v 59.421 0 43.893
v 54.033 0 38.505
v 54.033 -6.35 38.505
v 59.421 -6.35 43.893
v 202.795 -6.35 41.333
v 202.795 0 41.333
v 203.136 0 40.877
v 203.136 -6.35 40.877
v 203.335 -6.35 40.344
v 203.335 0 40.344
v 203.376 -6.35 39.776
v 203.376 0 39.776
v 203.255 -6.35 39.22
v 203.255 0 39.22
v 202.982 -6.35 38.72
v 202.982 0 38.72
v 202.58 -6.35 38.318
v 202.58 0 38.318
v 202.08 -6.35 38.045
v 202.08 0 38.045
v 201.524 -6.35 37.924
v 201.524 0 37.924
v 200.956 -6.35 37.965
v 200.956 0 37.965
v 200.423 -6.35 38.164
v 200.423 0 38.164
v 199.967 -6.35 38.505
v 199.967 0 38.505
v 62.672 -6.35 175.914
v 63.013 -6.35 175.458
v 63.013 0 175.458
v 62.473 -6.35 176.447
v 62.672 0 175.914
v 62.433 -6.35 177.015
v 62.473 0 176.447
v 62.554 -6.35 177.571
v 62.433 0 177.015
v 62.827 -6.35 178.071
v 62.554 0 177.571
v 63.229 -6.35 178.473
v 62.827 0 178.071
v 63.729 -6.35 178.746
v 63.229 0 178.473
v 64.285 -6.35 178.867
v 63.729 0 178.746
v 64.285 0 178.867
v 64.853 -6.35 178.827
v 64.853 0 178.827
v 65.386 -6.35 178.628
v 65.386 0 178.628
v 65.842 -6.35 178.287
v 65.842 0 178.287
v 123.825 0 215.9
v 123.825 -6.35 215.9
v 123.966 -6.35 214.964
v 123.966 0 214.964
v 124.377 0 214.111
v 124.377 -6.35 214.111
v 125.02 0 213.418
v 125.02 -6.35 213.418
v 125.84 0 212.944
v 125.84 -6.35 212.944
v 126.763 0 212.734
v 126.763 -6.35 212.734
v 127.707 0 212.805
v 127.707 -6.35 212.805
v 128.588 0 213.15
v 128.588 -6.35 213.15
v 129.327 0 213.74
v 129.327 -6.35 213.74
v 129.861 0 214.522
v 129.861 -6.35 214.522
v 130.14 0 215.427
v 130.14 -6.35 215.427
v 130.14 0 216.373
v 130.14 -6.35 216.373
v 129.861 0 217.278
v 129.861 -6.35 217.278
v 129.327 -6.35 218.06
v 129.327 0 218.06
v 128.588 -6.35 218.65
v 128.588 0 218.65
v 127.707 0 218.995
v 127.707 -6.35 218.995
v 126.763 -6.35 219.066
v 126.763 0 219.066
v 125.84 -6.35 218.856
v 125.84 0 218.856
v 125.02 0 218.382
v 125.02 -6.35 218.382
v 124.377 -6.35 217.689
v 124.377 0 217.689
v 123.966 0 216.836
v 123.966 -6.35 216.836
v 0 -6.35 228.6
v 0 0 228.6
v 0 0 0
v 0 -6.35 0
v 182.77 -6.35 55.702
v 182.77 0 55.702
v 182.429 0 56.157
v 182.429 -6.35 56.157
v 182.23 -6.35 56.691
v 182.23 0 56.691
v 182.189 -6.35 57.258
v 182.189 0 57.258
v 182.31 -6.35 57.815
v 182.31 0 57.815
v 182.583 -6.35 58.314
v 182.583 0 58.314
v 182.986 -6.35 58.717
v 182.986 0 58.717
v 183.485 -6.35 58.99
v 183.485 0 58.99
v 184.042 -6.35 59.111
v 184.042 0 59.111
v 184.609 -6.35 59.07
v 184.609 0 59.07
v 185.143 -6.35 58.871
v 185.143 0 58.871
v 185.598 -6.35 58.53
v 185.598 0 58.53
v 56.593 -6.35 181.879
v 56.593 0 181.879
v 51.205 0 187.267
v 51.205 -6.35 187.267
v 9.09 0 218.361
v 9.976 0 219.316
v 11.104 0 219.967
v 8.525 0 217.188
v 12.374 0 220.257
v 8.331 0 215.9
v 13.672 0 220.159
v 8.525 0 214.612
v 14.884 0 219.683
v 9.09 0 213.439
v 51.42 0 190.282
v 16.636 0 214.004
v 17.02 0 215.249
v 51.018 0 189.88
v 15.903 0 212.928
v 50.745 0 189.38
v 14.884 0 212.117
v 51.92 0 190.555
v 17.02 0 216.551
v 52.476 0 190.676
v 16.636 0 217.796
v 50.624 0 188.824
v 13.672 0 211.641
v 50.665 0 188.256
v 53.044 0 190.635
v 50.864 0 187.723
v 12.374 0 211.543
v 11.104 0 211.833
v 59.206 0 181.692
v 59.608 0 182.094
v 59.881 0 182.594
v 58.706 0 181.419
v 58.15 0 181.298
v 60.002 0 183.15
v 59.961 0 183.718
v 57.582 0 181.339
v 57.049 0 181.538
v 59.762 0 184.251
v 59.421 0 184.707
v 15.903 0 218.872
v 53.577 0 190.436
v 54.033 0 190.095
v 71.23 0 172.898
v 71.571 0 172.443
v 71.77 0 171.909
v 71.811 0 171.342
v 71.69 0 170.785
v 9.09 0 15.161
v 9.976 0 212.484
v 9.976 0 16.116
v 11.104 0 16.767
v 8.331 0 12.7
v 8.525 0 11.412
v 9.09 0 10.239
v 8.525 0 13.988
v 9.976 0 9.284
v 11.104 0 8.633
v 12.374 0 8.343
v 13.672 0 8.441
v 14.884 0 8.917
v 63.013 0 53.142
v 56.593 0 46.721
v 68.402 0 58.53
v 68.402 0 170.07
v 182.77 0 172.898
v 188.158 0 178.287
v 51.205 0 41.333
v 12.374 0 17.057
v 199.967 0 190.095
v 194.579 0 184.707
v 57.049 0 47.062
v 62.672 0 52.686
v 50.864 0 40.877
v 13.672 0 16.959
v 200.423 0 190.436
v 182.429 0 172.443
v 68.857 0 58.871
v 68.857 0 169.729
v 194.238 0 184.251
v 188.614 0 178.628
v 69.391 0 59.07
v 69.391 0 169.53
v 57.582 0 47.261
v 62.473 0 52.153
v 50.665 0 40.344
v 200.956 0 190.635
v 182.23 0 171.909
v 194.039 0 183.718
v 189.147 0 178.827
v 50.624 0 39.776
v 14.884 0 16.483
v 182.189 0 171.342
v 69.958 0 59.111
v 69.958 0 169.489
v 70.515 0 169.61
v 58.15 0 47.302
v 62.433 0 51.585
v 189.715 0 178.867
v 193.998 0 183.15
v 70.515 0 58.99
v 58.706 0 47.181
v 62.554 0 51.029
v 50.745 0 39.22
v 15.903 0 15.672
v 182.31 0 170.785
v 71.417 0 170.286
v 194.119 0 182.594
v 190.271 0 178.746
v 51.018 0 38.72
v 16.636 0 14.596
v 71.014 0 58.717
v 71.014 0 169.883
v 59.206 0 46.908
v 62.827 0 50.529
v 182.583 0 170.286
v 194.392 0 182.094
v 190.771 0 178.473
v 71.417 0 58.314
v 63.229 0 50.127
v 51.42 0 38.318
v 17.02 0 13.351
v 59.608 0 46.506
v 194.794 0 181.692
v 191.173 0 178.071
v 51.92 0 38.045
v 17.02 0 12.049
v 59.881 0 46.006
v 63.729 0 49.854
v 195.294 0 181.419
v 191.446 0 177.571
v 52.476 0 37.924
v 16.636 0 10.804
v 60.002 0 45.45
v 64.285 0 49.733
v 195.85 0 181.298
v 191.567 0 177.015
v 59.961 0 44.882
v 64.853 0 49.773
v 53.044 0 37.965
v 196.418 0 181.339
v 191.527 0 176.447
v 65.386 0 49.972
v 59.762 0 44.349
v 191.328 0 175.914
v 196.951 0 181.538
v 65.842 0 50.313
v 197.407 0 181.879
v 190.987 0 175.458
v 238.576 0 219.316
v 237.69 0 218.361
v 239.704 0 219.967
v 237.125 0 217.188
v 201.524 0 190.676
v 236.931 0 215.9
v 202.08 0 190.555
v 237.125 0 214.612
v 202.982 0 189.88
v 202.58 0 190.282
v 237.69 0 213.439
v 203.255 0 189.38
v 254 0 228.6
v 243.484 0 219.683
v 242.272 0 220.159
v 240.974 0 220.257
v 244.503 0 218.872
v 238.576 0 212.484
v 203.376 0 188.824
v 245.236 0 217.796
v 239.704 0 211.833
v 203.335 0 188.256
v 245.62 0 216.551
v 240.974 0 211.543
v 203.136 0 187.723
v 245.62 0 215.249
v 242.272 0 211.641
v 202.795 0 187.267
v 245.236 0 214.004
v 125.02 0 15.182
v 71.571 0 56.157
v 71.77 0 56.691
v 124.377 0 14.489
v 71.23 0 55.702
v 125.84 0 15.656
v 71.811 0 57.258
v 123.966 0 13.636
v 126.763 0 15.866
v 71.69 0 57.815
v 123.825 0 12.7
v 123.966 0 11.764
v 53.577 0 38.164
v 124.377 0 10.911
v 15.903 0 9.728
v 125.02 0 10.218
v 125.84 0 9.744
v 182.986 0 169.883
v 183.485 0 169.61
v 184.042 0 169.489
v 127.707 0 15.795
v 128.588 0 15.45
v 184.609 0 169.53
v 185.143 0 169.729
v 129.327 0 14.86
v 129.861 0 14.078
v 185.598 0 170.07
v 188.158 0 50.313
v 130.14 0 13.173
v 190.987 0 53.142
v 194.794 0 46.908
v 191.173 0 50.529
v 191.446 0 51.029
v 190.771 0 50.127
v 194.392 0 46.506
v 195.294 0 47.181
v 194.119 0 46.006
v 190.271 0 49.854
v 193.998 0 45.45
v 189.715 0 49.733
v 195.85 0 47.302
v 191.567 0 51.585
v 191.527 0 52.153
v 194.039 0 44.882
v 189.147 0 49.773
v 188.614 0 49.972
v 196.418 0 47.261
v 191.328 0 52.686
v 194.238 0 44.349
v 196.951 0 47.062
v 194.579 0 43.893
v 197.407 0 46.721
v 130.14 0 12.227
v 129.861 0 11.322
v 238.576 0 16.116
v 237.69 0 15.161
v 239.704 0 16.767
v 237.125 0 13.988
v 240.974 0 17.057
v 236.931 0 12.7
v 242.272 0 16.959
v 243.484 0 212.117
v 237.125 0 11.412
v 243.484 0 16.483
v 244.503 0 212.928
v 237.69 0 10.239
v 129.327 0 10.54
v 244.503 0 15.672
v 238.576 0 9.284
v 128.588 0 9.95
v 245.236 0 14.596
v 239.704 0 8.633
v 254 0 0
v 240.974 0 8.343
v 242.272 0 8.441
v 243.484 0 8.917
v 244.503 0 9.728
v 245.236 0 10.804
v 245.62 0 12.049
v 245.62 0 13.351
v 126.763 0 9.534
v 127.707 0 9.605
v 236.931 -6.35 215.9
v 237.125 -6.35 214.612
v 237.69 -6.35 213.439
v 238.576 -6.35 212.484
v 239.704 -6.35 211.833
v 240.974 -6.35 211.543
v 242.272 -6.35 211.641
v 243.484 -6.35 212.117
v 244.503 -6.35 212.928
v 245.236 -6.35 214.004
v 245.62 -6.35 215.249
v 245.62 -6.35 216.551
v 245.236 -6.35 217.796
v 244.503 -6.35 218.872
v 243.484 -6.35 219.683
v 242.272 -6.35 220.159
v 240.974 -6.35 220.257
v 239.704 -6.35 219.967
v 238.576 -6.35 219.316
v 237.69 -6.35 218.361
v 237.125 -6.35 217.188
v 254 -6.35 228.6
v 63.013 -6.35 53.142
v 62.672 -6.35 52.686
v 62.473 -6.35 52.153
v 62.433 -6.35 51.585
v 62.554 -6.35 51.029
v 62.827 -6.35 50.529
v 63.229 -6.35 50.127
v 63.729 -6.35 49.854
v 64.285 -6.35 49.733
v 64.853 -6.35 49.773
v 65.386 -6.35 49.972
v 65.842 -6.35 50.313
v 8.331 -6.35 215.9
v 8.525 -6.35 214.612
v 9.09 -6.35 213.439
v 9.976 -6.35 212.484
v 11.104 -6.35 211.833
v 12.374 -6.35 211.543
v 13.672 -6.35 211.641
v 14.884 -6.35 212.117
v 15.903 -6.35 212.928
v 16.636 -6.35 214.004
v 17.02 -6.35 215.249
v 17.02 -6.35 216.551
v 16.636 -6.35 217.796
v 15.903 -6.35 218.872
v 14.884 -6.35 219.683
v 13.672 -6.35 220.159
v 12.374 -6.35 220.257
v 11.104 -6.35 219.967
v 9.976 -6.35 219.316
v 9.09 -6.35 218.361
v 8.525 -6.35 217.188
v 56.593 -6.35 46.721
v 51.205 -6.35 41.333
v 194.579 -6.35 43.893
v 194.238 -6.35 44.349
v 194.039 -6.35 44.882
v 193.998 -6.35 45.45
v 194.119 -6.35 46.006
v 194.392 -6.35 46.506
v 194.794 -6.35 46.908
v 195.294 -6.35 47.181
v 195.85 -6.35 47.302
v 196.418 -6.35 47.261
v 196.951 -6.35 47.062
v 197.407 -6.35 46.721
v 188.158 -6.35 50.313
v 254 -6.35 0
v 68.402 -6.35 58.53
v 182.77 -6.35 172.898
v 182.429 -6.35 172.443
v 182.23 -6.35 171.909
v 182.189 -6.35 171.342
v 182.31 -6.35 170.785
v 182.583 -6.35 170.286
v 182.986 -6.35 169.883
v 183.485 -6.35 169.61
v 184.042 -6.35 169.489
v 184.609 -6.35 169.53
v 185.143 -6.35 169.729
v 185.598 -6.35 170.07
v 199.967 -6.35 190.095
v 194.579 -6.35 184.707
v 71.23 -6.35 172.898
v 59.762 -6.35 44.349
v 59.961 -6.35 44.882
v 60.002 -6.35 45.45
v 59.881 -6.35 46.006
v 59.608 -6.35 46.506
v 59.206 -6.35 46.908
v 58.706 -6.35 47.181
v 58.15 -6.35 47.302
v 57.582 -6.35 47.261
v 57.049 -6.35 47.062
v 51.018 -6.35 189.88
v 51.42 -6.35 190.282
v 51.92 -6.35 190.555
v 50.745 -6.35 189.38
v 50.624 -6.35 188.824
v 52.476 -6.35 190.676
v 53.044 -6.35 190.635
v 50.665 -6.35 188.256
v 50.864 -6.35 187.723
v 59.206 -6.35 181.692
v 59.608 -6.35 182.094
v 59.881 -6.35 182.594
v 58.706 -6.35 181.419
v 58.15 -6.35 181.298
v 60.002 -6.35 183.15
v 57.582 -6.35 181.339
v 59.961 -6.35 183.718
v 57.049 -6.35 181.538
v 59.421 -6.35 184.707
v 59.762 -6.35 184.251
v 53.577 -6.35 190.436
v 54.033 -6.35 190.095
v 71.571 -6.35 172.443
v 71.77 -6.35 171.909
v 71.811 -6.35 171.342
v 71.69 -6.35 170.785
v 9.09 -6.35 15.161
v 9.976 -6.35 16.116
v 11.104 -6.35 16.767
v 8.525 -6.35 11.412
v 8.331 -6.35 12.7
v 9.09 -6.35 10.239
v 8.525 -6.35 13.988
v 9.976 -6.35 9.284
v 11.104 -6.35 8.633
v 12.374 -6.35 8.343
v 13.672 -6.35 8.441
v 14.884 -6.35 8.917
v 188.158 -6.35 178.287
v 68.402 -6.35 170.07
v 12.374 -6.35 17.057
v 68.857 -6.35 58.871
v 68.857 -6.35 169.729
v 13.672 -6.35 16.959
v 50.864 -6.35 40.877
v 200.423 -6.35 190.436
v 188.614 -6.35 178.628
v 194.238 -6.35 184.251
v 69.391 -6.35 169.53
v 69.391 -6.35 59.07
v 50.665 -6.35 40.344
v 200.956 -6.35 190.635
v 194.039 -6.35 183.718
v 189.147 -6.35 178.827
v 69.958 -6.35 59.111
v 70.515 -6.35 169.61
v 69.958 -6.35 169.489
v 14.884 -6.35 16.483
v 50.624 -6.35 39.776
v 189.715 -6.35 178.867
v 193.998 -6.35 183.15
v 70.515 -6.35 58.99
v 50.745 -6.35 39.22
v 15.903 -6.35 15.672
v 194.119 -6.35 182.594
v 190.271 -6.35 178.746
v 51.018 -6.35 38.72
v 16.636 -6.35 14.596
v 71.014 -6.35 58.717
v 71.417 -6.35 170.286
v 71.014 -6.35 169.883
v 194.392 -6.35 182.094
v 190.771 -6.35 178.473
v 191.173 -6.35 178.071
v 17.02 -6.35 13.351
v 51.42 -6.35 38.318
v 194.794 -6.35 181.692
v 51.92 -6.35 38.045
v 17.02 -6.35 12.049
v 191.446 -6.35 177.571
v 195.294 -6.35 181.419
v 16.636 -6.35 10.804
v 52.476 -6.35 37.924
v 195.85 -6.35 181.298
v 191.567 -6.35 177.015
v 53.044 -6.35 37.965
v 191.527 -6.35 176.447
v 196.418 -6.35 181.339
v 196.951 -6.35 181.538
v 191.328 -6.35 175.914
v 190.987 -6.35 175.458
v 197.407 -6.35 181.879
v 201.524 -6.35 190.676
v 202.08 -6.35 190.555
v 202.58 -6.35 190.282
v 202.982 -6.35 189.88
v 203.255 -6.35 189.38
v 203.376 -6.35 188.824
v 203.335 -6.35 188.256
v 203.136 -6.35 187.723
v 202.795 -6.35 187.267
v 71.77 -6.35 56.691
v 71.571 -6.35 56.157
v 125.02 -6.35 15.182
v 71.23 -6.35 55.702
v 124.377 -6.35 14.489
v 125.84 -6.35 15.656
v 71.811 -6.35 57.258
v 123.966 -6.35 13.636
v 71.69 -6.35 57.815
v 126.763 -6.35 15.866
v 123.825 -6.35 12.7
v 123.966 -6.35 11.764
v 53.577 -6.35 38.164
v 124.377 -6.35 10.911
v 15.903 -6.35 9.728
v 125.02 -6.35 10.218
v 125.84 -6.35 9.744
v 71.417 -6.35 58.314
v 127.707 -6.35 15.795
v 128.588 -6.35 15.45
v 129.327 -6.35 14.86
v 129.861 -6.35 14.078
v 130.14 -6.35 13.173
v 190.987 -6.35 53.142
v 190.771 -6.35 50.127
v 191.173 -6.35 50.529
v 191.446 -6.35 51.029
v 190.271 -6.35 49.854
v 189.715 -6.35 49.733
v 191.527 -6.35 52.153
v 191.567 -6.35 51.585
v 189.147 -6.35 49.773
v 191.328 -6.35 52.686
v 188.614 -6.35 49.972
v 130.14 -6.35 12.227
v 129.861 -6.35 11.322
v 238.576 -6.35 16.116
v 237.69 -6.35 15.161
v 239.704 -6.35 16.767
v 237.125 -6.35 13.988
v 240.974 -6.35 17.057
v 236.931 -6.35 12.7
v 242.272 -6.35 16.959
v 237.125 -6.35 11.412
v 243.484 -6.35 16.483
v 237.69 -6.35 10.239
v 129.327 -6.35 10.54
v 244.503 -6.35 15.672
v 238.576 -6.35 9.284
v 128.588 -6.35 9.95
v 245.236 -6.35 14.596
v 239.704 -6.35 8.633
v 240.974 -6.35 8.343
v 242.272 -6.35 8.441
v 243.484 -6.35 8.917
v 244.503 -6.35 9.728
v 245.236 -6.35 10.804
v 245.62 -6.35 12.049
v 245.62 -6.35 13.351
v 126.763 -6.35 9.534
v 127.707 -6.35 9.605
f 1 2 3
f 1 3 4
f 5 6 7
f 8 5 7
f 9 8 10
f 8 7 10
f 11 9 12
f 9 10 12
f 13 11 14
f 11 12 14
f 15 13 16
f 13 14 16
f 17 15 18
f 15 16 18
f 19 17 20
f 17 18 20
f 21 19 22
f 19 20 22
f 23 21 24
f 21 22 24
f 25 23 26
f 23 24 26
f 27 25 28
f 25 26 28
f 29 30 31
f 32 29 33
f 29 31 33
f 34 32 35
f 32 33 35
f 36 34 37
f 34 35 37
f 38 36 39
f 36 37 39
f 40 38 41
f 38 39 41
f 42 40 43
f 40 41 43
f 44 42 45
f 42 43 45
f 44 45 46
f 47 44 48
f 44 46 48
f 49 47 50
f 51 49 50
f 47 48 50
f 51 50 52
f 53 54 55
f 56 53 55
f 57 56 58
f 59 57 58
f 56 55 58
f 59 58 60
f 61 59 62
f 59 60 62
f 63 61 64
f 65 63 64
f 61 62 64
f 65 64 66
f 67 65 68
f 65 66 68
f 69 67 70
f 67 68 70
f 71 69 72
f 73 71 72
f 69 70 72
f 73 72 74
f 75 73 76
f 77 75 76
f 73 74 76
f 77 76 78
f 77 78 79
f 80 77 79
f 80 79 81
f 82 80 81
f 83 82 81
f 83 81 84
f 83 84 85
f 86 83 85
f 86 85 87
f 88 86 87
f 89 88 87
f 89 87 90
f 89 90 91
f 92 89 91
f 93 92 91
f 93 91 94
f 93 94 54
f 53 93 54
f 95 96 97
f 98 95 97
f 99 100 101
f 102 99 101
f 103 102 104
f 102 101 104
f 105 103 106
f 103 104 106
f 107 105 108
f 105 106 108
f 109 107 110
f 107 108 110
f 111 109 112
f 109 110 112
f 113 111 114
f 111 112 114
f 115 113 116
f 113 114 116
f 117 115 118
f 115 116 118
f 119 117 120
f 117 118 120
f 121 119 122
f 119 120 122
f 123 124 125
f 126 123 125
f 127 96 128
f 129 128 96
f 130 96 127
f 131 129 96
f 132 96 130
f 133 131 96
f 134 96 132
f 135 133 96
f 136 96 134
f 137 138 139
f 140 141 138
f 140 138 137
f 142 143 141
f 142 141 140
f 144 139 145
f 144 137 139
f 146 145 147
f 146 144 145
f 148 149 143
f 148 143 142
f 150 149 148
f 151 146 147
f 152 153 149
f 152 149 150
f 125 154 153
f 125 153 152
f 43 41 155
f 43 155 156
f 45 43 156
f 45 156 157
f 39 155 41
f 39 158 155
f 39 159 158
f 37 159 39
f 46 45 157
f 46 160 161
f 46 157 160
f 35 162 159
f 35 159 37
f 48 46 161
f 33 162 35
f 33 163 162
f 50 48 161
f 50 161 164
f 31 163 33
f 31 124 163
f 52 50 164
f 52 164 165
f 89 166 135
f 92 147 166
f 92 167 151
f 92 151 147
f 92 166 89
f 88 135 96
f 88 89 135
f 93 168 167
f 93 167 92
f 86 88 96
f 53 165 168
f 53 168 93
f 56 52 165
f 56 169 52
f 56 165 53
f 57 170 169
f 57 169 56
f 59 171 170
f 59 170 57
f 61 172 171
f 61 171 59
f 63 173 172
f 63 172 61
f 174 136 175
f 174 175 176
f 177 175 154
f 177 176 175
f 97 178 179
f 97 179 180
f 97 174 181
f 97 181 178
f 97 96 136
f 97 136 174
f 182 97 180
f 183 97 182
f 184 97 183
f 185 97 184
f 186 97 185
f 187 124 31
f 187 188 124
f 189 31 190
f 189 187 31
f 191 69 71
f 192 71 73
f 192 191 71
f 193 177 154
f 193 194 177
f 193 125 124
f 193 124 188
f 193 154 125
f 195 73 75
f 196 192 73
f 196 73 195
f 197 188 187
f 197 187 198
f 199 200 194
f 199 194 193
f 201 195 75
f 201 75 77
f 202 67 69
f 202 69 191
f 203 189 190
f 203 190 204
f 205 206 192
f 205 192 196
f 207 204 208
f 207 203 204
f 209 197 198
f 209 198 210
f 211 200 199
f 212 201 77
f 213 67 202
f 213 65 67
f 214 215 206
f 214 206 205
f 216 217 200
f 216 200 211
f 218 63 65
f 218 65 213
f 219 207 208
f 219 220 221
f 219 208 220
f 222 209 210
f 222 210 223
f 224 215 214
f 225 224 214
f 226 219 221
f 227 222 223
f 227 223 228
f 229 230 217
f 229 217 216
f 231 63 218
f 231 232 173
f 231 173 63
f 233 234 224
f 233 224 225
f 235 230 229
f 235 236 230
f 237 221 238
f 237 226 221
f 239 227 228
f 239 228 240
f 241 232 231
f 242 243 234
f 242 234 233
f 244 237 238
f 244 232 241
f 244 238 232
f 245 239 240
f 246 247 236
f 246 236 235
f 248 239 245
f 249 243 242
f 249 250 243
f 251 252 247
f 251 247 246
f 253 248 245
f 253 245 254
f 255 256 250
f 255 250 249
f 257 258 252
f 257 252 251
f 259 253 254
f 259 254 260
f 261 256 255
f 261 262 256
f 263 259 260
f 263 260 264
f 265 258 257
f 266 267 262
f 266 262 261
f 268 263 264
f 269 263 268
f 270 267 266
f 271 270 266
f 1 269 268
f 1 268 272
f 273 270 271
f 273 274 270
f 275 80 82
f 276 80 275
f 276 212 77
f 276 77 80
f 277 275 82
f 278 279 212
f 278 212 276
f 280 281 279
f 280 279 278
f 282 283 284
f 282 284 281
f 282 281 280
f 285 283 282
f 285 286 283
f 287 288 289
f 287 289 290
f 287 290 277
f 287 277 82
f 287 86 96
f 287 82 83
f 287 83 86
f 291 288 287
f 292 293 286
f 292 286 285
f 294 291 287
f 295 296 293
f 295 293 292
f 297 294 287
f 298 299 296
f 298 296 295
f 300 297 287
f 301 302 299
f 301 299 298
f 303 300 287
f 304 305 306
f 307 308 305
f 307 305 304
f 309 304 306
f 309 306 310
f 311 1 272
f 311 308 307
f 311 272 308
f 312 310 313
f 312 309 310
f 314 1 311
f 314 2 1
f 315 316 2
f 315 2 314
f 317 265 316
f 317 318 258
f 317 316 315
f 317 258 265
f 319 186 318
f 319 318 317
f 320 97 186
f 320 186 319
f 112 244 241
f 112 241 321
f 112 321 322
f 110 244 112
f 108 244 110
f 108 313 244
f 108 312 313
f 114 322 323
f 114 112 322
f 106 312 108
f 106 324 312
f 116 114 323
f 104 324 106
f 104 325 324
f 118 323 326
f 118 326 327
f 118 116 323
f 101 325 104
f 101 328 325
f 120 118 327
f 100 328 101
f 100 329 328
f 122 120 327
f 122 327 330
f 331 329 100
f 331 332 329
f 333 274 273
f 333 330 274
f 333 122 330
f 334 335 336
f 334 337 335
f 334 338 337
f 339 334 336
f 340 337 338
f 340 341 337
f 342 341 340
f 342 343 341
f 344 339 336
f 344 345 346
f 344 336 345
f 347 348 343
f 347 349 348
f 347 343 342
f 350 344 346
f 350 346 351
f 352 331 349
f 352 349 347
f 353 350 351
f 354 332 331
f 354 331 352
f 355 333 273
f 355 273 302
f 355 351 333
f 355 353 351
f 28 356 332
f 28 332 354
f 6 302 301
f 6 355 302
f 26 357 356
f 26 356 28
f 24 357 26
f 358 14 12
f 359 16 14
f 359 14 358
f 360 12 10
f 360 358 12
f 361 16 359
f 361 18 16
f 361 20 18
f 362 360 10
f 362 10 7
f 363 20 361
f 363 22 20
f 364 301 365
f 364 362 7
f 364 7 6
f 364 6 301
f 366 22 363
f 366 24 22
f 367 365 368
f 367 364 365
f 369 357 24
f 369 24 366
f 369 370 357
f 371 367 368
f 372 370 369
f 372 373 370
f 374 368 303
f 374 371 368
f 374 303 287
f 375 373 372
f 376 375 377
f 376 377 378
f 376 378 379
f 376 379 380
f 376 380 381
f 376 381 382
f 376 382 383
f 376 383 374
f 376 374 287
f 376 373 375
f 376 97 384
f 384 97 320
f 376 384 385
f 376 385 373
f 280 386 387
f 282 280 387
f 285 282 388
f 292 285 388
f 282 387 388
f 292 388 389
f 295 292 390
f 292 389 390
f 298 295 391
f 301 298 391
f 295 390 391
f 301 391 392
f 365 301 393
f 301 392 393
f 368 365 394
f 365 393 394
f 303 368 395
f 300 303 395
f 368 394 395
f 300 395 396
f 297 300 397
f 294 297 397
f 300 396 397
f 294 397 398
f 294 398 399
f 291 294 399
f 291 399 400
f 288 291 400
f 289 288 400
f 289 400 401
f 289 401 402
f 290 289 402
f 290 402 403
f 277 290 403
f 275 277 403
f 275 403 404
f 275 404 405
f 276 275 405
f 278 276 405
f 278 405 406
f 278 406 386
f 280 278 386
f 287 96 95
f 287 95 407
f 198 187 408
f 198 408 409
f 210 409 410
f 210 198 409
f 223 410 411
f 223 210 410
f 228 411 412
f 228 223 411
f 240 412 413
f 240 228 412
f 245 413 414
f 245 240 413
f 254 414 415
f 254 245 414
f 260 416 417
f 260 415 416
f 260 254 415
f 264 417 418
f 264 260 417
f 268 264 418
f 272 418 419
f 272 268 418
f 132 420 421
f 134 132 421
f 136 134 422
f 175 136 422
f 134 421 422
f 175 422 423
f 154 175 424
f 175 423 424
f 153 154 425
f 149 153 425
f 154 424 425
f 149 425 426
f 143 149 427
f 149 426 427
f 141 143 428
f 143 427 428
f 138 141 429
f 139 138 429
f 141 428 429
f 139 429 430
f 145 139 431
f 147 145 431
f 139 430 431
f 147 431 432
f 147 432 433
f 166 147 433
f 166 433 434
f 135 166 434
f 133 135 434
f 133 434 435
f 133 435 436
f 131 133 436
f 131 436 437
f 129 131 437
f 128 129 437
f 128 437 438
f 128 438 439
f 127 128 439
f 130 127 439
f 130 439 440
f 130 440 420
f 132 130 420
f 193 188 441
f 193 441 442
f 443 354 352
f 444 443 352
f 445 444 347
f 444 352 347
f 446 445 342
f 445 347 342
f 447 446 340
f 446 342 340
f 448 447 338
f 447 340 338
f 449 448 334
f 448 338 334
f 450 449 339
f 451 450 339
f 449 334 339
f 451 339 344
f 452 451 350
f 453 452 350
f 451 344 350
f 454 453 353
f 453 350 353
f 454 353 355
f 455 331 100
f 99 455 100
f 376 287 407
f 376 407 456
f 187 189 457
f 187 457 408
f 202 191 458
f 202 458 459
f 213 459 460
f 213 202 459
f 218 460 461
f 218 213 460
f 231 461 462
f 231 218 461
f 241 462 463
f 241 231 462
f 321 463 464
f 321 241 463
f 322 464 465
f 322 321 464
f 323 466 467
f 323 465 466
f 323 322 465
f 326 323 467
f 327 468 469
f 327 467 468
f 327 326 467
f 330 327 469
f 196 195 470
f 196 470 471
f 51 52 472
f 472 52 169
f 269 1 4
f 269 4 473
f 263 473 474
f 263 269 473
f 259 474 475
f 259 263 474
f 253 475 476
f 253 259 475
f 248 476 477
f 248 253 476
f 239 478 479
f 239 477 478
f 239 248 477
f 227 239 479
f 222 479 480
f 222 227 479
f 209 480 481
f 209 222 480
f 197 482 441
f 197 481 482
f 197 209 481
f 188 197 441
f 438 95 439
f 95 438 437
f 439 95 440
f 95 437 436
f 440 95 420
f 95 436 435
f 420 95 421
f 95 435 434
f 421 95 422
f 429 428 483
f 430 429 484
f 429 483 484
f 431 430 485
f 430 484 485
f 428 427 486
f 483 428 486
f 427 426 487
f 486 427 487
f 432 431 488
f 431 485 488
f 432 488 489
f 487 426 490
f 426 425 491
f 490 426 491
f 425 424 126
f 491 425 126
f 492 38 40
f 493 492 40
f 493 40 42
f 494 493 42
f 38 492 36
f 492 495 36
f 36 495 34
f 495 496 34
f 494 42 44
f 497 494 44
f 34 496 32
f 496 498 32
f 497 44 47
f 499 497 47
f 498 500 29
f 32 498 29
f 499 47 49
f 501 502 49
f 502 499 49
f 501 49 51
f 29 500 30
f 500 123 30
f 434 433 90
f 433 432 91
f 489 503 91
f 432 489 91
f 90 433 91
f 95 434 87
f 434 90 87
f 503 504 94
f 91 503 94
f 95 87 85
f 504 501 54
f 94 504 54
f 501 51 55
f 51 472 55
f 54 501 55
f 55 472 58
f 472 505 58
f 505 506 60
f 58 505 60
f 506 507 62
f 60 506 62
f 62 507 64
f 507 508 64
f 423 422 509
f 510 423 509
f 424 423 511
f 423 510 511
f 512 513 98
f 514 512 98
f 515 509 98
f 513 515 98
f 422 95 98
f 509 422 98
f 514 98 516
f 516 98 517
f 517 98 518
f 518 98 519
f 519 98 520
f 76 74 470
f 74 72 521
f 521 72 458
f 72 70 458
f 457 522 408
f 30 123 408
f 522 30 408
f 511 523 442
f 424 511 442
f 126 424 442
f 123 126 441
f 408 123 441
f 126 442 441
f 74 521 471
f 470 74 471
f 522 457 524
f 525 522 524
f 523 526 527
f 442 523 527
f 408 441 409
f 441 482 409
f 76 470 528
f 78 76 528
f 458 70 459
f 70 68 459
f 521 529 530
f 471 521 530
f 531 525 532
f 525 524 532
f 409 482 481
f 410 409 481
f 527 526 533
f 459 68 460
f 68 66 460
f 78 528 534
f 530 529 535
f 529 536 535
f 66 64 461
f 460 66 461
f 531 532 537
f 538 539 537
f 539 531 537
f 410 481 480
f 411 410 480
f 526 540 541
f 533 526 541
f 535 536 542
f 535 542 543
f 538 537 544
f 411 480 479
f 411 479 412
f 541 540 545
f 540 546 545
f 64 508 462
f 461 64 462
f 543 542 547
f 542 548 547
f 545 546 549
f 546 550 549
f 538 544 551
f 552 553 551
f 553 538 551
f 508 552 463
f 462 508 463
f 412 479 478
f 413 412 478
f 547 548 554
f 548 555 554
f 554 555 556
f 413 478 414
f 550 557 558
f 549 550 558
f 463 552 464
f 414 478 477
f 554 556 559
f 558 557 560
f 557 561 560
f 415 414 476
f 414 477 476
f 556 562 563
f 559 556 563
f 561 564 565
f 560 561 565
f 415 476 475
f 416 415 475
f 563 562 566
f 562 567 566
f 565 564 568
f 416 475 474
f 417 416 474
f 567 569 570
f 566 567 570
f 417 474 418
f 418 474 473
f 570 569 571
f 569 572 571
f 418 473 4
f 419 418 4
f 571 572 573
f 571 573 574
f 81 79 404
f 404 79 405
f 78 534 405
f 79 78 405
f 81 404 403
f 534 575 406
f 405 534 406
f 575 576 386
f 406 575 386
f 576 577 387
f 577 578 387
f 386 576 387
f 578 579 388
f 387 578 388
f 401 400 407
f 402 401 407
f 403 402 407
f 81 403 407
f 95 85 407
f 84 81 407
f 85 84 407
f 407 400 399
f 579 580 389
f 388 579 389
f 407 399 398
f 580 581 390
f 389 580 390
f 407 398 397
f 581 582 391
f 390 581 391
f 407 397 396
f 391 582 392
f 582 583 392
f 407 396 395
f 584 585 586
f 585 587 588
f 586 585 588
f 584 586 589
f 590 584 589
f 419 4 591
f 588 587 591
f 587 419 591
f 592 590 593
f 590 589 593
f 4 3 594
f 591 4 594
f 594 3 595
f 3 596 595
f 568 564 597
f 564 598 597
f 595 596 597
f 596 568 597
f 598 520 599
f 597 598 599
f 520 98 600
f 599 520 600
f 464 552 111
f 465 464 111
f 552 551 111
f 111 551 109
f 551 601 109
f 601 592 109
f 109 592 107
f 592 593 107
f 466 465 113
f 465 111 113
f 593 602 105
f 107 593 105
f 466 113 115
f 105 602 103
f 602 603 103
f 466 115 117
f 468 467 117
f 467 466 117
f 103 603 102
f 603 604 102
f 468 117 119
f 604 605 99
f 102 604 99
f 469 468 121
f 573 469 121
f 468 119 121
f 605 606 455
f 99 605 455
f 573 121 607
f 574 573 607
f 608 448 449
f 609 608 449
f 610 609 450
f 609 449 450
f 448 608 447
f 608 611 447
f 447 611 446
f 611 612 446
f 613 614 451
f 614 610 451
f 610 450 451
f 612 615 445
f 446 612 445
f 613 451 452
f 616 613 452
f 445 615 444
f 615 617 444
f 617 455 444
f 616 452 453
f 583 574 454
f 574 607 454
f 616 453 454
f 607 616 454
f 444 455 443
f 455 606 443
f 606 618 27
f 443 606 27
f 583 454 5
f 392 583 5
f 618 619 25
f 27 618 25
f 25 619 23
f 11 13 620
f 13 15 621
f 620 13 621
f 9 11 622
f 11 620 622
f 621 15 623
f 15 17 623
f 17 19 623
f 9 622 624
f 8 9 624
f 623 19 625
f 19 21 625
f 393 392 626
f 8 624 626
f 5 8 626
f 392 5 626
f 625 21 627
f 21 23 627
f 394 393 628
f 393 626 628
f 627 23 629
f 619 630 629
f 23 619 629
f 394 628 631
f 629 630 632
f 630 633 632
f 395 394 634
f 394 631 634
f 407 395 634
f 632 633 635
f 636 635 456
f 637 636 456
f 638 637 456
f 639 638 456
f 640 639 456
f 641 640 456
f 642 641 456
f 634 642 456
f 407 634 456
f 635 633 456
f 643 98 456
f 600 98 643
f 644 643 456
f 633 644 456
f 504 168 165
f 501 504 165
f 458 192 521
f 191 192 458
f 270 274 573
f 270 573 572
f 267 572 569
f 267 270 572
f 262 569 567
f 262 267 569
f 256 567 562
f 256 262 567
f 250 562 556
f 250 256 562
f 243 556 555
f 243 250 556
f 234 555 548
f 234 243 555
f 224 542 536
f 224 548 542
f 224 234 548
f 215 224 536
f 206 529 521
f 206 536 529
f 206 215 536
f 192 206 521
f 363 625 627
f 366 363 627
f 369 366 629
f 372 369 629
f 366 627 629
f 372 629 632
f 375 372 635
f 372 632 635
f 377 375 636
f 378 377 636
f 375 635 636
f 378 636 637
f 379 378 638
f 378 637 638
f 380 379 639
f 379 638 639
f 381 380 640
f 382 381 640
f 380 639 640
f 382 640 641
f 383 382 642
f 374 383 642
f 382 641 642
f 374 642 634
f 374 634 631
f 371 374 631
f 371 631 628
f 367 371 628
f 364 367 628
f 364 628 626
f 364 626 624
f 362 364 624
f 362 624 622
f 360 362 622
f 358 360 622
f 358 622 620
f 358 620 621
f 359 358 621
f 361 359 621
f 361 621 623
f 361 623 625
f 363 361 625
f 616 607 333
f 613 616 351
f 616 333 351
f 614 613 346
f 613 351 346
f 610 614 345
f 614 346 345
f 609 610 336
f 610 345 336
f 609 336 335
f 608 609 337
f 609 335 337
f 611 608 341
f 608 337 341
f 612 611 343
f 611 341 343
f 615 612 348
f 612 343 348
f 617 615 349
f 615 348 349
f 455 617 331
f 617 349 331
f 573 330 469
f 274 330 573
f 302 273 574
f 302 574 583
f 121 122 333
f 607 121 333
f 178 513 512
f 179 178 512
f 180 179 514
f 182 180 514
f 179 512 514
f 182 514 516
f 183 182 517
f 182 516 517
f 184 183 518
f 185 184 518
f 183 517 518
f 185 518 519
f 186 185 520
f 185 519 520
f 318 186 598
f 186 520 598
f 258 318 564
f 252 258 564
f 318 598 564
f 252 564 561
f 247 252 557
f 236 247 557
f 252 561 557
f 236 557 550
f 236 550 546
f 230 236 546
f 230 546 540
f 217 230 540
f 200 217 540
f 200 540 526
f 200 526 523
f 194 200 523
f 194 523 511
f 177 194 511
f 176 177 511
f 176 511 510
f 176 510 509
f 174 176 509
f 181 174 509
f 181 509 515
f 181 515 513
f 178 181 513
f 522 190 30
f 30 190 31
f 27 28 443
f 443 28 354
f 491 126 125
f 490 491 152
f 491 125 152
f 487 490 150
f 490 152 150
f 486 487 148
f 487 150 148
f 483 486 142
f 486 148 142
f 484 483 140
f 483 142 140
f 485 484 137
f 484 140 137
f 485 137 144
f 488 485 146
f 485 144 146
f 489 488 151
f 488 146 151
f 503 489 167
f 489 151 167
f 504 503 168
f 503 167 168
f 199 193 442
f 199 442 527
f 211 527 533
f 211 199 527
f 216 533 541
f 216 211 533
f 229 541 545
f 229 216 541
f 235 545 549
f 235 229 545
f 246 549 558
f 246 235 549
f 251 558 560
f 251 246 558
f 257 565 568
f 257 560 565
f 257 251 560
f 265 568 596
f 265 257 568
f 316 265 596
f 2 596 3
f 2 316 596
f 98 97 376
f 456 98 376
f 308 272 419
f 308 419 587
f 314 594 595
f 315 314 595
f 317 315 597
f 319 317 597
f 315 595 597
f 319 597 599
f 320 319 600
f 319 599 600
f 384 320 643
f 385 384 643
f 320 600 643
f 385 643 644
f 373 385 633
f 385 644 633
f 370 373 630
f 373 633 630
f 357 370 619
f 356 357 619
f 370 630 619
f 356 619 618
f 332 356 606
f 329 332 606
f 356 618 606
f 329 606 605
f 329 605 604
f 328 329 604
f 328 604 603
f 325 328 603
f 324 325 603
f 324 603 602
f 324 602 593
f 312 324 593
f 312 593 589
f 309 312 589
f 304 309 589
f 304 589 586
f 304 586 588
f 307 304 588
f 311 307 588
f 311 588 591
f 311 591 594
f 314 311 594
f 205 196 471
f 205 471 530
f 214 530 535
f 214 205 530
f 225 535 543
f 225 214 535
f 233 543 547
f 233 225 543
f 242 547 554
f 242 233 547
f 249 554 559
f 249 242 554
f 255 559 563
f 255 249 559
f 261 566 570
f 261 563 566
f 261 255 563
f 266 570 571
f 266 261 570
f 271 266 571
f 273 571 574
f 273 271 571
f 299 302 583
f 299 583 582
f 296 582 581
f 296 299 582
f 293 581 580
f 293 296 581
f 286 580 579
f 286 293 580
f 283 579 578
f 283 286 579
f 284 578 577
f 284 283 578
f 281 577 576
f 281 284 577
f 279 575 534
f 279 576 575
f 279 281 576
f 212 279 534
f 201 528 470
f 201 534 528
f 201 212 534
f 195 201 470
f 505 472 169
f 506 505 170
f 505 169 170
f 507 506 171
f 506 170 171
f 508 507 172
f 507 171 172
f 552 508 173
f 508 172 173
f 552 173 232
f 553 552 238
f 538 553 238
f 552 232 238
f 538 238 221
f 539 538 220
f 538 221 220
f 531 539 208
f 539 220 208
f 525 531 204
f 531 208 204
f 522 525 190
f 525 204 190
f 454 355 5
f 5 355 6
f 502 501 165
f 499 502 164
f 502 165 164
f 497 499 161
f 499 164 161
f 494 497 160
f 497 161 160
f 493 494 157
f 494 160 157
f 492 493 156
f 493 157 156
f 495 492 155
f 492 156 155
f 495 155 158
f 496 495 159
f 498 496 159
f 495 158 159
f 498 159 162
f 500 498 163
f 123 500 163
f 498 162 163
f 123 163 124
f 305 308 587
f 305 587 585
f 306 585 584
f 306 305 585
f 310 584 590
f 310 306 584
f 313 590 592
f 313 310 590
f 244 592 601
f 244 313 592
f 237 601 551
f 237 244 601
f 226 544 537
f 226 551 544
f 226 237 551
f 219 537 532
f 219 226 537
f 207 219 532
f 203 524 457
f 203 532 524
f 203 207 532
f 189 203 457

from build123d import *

# Parameters (mm, degrees)
SKETCH1_W                            = 254
SKETCH1_H                            = 228.6
BASE_PLATE_DEPTH                     = 6.35
SLOTS_DEPTH                          = 7.35
FEET_CONNECTION_HOLE_D               = 8.7376
HOLE_FOR_10_BLIND_FASTENERS_B_BS_1_D = 6.35


with BuildPart() as part:
    # Sketch1 → base plate (new body)
    with BuildSketch(Plane(origin=(0, 0, 0), x_dir=(1, 0, 0), z_dir=(0, 1, 0))):
        with Locations((127, -114.3)):
            Rectangle(SKETCH1_W, SKETCH1_H)
    extrude(amount=-BASE_PLATE_DEPTH)

    # Sketch3 → slots (cut, through all)
    with BuildSketch(Plane(origin=(0, 0, 0), x_dir=(1, 0, 0), z_dir=(0, 1, 0))):
        with BuildLine():
            ThreePointArc((59.421325374, -43.892898159), (59.421325374, -46.721325374), (56.592898159, -46.721325374))
            Line((56.592898159, -46.721325374), (51.204744487, -41.333171702))
            ThreePointArc((51.204744487, -41.333171702), (51.204744487, -38.504744487), (54.033171702, -38.504744487))
            Line((54.033171702, -38.504744487), (59.421325374, -43.892898159))
        make_face()
        with BuildLine():
            Line((199.966828298, -38.504744487), (194.578674626, -43.892898159))
            ThreePointArc((194.578674626, -43.892898159), (194.578674626, -46.721325374), (197.407101841, -46.721325374))
            Line((197.407101841, -46.721325374), (202.795255513, -41.333171702))
            ThreePointArc((202.795255513, -41.333171702), (202.795255513, -38.504744487), (199.966828298, -38.504744487))
        make_face()
        with BuildLine():
            Line((185.598418504, -58.530008711), (190.986572177, -53.141855038))
            ThreePointArc((190.986572177, -53.141855038), (190.986572177, -50.313427823), (188.158144962, -50.313427823))
            Line((188.158144962, -50.313427823), (182.769991289, -55.701581496))
            ThreePointArc((182.769991289, -55.701581496), (182.769991289, -58.530008711), (185.598418504, -58.530008711))
        make_face()
        with BuildLine():
            ThreePointArc((190.986572177, -175.458144962), (190.986572177, -178.286572177), (188.158144962, -178.286572177))
            Line((188.158144962, -178.286572177), (182.769991289, -172.898418504))
            ThreePointArc((182.769991289, -172.898418504), (182.769991289, -170.069991289), (185.598418504, -170.069991289))
            Line((185.598418504, -170.069991289), (190.986572177, -175.458144962))
        make_face()
        with BuildLine():
            ThreePointArc((194.578674626, -184.707101841), (194.578674626, -181.878674626), (197.407101841, -181.878674626))
            Line((197.407101841, -181.878674626), (202.795255513, -187.266828298))
            ThreePointArc((202.795255513, -187.266828298), (202.795255513, -190.095255513), (199.966828298, -190.095255513))
            Line((199.966828298, -190.095255513), (194.578674626, -184.707101841))
        make_face()
        with BuildLine():
            Line((54.033171702, -190.095255513), (59.421325374, -184.707101841))
            ThreePointArc((59.421325374, -184.707101841), (59.421325374, -181.878674626), (56.592898159, -181.878674626))
            Line((56.592898159, -181.878674626), (51.204744487, -187.266828298))
            ThreePointArc((51.204744487, -187.266828298), (51.204744487, -190.095255513), (54.033171702, -190.095255513))
        make_face()
        with BuildLine():
            Line((68.401581496, -170.069991289), (63.013427823, -175.458144962))
            ThreePointArc((63.013427823, -175.458144962), (63.013427823, -178.286572177), (65.841855038, -178.286572177))
            Line((65.841855038, -178.286572177), (71.230008711, -172.898418504))
            ThreePointArc((71.230008711, -172.898418504), (71.230008711, -170.069991289), (68.401581496, -170.069991289))
        make_face()
        with BuildLine():
            Line((68.401581496, -58.530008711), (63.013427823, -53.141855038))
            ThreePointArc((63.013427823, -53.141855038), (63.013427823, -50.313427823), (65.841855038, -50.313427823))
            Line((65.841855038, -50.313427823), (71.230008711, -55.701581496))
            ThreePointArc((71.230008711, -55.701581496), (71.230008711, -58.530008711), (68.401581496, -58.530008711))
        make_face()
    extrude(amount=-SLOTS_DEPTH, mode=Mode.SUBTRACT)

    # Feet connection hole (through all)
    with Locations(Plane(origin=(0, 0, 0), x_dir=(1, 0, 0), z_dir=(0, 1, 0))):
        with Locations((12.7, -215.9), (241.3, -12.7), (12.7, -12.7), (241.3, -215.9)):
            Hole(FEET_CONNECTION_HOLE_D / 2)

    # Hole for #10 Blind Fasteners (B,BS)1 (through all)
    with Locations(Plane(origin=(0, 0, 0), x_dir=(1, 0, 0), z_dir=(0, 1, 0))):
        with Locations((127, -215.9), (127, -12.7)):
            Hole(HOLE_FOR_10_BLIND_FASTENERS_B_BS_1_D / 2)


solid = part.part
